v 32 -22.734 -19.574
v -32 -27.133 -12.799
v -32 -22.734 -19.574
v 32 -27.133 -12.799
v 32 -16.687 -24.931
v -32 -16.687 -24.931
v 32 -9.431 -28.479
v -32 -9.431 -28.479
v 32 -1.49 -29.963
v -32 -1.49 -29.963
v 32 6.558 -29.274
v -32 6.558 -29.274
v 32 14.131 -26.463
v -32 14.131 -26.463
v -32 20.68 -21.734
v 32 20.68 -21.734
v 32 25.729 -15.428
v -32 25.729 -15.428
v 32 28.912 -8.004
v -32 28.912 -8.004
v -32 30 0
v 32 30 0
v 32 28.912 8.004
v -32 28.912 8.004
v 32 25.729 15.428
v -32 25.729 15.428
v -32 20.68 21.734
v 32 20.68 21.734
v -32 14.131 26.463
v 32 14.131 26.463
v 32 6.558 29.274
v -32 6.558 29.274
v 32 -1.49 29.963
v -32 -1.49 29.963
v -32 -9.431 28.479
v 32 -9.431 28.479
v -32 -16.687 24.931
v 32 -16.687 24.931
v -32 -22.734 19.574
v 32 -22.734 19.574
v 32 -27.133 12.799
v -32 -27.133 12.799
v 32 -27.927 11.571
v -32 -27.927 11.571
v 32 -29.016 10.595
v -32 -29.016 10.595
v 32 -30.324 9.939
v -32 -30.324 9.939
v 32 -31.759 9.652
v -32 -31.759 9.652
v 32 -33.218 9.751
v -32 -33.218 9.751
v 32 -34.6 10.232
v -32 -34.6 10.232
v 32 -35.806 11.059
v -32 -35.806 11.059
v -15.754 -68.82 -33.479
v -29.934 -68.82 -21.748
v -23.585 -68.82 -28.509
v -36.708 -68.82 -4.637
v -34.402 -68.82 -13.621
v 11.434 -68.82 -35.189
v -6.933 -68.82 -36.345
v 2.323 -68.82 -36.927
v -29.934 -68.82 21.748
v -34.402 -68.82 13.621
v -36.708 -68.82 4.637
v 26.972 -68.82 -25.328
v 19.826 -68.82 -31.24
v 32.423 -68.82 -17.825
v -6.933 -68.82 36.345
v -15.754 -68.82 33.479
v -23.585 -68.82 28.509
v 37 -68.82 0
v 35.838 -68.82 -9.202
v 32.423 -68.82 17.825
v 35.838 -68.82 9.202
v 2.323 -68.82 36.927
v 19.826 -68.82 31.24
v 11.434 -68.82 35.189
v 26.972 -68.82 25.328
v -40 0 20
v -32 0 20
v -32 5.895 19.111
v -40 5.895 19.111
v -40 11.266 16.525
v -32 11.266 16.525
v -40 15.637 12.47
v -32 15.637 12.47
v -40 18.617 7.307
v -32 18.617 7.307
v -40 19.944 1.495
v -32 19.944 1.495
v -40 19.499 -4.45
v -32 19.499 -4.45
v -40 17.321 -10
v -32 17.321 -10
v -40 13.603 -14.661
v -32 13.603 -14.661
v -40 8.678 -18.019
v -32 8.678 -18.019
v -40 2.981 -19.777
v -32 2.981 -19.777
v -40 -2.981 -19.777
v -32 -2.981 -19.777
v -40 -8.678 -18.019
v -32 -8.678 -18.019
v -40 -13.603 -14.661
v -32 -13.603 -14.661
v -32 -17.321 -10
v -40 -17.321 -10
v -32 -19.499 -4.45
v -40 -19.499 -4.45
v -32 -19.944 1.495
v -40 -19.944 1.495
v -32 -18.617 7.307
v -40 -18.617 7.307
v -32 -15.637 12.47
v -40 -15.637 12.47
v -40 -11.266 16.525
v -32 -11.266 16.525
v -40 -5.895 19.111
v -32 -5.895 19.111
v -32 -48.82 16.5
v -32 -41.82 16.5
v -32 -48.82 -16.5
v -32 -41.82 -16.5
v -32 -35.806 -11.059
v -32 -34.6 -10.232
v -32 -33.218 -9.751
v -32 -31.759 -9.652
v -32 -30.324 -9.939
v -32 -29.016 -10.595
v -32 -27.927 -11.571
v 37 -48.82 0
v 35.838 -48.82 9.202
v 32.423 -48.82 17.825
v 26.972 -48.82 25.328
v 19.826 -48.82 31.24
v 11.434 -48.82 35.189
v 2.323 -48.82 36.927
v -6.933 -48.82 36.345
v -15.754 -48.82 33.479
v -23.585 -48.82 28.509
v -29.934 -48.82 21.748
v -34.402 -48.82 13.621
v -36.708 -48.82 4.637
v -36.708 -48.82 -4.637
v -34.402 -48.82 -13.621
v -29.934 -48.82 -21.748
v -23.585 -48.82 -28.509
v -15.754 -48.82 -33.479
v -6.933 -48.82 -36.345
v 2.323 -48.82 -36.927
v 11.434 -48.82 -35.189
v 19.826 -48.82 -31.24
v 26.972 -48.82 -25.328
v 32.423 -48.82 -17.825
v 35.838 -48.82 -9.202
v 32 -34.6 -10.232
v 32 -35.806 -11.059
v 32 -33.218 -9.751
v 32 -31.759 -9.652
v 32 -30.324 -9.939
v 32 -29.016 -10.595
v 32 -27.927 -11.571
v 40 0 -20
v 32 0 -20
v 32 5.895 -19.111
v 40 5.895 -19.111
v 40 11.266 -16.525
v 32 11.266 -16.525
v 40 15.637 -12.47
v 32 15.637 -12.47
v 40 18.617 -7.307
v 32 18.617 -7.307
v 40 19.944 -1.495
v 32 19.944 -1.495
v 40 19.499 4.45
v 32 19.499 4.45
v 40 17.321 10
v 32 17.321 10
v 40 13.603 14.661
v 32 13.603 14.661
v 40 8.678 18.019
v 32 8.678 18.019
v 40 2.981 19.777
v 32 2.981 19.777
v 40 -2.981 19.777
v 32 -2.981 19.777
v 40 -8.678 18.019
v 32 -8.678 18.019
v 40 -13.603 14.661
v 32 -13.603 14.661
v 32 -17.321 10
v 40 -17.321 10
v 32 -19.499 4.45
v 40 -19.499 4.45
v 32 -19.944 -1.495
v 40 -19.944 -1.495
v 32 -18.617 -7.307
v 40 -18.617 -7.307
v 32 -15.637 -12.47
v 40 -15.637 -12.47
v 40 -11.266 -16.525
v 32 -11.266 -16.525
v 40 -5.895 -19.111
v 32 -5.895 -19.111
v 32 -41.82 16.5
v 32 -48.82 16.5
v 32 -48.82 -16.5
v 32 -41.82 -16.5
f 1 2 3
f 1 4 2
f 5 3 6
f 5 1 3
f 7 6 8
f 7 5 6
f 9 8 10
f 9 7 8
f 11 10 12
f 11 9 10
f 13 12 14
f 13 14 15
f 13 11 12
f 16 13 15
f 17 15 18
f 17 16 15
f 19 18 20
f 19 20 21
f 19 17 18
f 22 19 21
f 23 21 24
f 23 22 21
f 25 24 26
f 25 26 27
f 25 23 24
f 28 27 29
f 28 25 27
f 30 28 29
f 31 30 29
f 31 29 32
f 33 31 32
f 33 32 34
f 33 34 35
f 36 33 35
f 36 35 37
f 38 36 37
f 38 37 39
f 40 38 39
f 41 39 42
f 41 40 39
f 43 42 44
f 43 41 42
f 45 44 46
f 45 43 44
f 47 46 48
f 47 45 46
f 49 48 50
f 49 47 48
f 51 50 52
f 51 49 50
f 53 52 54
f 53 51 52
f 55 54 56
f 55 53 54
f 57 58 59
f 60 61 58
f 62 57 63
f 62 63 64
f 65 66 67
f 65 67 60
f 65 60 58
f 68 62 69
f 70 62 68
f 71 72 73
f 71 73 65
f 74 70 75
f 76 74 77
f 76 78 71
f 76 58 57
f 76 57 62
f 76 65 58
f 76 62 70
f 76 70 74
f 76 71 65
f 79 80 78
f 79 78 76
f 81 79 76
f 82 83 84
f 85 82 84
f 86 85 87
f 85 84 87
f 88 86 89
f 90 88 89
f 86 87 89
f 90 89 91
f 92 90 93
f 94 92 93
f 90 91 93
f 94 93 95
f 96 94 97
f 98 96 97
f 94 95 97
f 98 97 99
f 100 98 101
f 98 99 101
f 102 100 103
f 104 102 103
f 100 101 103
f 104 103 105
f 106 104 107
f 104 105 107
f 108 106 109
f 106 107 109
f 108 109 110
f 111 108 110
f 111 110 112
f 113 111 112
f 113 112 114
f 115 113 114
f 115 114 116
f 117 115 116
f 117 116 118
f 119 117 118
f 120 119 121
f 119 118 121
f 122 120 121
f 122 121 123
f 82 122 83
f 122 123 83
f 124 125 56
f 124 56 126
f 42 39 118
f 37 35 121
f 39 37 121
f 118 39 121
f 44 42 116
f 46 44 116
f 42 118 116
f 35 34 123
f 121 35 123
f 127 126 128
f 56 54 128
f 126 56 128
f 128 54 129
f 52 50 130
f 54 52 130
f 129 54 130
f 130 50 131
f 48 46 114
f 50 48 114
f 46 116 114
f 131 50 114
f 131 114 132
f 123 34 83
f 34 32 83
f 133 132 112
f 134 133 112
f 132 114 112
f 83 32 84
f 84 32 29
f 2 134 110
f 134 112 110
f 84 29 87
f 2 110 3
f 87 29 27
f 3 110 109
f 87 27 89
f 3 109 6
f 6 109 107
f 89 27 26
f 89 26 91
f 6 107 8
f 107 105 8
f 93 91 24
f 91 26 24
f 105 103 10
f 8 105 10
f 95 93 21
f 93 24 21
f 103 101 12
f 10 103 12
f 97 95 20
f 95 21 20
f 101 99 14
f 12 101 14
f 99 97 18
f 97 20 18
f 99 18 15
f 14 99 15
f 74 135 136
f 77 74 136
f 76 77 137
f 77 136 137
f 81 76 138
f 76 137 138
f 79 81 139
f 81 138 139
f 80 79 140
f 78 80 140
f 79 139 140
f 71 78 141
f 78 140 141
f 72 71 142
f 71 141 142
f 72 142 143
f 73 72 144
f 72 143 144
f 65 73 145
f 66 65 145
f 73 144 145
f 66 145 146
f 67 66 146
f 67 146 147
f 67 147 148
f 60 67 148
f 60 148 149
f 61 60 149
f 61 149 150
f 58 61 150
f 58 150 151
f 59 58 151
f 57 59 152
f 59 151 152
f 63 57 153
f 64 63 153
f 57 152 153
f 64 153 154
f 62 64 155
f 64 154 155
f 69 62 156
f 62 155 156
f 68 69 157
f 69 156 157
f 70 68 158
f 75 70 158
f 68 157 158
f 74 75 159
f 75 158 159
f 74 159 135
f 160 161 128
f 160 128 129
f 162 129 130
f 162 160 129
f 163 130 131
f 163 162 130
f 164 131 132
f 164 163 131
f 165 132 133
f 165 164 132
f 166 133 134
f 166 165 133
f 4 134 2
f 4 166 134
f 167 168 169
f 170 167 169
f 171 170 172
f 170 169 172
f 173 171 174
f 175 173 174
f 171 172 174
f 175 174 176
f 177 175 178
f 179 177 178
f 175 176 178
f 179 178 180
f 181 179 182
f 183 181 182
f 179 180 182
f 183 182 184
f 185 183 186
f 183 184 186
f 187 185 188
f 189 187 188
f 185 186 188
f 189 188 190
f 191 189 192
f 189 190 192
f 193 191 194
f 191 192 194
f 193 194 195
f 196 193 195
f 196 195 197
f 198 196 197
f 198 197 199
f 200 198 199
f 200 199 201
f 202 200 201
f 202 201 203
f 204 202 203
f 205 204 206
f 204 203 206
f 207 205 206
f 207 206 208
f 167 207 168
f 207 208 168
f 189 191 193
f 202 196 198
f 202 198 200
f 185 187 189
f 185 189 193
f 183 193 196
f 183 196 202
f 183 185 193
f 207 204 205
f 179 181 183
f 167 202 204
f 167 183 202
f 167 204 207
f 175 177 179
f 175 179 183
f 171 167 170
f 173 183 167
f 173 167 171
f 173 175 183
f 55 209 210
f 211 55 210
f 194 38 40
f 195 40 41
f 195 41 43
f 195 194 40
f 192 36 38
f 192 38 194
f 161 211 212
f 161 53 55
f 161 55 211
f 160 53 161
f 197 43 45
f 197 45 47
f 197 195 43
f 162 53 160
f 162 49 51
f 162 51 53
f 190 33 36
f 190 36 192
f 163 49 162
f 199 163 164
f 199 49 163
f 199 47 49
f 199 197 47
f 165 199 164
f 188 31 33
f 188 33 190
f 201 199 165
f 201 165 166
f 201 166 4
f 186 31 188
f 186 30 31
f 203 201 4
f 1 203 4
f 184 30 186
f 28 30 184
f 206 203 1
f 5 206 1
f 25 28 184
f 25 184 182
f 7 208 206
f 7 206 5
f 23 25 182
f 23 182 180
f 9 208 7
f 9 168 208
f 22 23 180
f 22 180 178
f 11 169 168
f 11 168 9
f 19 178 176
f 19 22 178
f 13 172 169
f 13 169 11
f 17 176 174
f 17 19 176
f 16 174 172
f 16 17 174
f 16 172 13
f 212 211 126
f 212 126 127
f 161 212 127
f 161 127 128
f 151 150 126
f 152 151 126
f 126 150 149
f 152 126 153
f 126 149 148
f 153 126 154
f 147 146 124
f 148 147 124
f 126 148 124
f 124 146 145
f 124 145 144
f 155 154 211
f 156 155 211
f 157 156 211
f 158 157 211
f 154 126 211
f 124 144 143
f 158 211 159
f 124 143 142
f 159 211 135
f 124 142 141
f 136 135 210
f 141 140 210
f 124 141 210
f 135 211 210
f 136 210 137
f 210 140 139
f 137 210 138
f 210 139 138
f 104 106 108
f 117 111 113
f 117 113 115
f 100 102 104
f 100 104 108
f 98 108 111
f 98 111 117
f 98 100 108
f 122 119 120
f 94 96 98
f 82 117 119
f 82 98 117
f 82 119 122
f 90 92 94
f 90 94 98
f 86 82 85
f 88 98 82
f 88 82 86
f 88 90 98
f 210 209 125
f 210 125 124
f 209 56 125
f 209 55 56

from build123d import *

# Parameters (mm, degrees)
BOSS_EXTRUDE1_DEPTH      = 32
BOSS_EXTRUDE1_DEPTH_BACK = 32
SKETCH3_R                = 20
BOSS_EXTRUDE2_DEPTH      = 8
SKETCH4_R                = 20
BOSS_EXTRUDE3_DEPTH      = 8
SKETCH5_R                = 37
BOSS_EXTRUDE4_DEPTH      = 20


with BuildPart() as part:
    # Sketch2 → Boss-Extrude1 (new body, two sides)
    with BuildSketch(Plane(origin=(0, 0, 0), x_dir=(0, 0, -1), z_dir=(1, 0, 0))) as boss_extrude1_sk:
        with BuildLine():
            Line((-11.058503278, -35.806497408), (-16.5, -41.82))
            Line((-16.5, -41.82), (-16.5, -48.82))
            Line((-16.5, -48.82), (16.5, -48.82))
            Line((16.5, -48.82), (16.5, -41.82))
            Line((16.5, -41.82), (11.058503278, -35.806497408))
            ThreePointArc((11.058503278, -35.806497408), (9.747712726, -31.031847175), (12.79921149, -27.132640587))
            ThreePointArc((12.79921149, -27.132640587), (0, 30), (-12.79921149, -27.132640587))
            ThreePointArc((-12.79921149, -27.132640587), (-9.747712726, -31.031847175), (-11.058503278, -35.806497408))
        make_face()
    extrude(amount=BOSS_EXTRUDE1_DEPTH)
    extrude(boss_extrude1_sk.sketch, amount=-BOSS_EXTRUDE1_DEPTH_BACK)

    # Sketch3 → Boss-Extrude2 (add)
    with BuildSketch(Plane(origin=(32, 0, 0), x_dir=(0, 0, -1), z_dir=(1, 0, 0))):
        Circle(SKETCH3_R)
    extrude(amount=BOSS_EXTRUDE2_DEPTH)

    # Sketch4 → Boss-Extrude3 (add)
    with BuildSketch(Plane.ZY.offset(32)):
        Circle(SKETCH4_R)
    extrude(amount=BOSS_EXTRUDE3_DEPTH)

    # Sketch5 → Boss-Extrude4 (add)
    with BuildSketch(Plane.XZ.offset(48.82)):
        Circle(SKETCH5_R)
    extrude(amount=BOSS_EXTRUDE4_DEPTH)


solid = part.part
